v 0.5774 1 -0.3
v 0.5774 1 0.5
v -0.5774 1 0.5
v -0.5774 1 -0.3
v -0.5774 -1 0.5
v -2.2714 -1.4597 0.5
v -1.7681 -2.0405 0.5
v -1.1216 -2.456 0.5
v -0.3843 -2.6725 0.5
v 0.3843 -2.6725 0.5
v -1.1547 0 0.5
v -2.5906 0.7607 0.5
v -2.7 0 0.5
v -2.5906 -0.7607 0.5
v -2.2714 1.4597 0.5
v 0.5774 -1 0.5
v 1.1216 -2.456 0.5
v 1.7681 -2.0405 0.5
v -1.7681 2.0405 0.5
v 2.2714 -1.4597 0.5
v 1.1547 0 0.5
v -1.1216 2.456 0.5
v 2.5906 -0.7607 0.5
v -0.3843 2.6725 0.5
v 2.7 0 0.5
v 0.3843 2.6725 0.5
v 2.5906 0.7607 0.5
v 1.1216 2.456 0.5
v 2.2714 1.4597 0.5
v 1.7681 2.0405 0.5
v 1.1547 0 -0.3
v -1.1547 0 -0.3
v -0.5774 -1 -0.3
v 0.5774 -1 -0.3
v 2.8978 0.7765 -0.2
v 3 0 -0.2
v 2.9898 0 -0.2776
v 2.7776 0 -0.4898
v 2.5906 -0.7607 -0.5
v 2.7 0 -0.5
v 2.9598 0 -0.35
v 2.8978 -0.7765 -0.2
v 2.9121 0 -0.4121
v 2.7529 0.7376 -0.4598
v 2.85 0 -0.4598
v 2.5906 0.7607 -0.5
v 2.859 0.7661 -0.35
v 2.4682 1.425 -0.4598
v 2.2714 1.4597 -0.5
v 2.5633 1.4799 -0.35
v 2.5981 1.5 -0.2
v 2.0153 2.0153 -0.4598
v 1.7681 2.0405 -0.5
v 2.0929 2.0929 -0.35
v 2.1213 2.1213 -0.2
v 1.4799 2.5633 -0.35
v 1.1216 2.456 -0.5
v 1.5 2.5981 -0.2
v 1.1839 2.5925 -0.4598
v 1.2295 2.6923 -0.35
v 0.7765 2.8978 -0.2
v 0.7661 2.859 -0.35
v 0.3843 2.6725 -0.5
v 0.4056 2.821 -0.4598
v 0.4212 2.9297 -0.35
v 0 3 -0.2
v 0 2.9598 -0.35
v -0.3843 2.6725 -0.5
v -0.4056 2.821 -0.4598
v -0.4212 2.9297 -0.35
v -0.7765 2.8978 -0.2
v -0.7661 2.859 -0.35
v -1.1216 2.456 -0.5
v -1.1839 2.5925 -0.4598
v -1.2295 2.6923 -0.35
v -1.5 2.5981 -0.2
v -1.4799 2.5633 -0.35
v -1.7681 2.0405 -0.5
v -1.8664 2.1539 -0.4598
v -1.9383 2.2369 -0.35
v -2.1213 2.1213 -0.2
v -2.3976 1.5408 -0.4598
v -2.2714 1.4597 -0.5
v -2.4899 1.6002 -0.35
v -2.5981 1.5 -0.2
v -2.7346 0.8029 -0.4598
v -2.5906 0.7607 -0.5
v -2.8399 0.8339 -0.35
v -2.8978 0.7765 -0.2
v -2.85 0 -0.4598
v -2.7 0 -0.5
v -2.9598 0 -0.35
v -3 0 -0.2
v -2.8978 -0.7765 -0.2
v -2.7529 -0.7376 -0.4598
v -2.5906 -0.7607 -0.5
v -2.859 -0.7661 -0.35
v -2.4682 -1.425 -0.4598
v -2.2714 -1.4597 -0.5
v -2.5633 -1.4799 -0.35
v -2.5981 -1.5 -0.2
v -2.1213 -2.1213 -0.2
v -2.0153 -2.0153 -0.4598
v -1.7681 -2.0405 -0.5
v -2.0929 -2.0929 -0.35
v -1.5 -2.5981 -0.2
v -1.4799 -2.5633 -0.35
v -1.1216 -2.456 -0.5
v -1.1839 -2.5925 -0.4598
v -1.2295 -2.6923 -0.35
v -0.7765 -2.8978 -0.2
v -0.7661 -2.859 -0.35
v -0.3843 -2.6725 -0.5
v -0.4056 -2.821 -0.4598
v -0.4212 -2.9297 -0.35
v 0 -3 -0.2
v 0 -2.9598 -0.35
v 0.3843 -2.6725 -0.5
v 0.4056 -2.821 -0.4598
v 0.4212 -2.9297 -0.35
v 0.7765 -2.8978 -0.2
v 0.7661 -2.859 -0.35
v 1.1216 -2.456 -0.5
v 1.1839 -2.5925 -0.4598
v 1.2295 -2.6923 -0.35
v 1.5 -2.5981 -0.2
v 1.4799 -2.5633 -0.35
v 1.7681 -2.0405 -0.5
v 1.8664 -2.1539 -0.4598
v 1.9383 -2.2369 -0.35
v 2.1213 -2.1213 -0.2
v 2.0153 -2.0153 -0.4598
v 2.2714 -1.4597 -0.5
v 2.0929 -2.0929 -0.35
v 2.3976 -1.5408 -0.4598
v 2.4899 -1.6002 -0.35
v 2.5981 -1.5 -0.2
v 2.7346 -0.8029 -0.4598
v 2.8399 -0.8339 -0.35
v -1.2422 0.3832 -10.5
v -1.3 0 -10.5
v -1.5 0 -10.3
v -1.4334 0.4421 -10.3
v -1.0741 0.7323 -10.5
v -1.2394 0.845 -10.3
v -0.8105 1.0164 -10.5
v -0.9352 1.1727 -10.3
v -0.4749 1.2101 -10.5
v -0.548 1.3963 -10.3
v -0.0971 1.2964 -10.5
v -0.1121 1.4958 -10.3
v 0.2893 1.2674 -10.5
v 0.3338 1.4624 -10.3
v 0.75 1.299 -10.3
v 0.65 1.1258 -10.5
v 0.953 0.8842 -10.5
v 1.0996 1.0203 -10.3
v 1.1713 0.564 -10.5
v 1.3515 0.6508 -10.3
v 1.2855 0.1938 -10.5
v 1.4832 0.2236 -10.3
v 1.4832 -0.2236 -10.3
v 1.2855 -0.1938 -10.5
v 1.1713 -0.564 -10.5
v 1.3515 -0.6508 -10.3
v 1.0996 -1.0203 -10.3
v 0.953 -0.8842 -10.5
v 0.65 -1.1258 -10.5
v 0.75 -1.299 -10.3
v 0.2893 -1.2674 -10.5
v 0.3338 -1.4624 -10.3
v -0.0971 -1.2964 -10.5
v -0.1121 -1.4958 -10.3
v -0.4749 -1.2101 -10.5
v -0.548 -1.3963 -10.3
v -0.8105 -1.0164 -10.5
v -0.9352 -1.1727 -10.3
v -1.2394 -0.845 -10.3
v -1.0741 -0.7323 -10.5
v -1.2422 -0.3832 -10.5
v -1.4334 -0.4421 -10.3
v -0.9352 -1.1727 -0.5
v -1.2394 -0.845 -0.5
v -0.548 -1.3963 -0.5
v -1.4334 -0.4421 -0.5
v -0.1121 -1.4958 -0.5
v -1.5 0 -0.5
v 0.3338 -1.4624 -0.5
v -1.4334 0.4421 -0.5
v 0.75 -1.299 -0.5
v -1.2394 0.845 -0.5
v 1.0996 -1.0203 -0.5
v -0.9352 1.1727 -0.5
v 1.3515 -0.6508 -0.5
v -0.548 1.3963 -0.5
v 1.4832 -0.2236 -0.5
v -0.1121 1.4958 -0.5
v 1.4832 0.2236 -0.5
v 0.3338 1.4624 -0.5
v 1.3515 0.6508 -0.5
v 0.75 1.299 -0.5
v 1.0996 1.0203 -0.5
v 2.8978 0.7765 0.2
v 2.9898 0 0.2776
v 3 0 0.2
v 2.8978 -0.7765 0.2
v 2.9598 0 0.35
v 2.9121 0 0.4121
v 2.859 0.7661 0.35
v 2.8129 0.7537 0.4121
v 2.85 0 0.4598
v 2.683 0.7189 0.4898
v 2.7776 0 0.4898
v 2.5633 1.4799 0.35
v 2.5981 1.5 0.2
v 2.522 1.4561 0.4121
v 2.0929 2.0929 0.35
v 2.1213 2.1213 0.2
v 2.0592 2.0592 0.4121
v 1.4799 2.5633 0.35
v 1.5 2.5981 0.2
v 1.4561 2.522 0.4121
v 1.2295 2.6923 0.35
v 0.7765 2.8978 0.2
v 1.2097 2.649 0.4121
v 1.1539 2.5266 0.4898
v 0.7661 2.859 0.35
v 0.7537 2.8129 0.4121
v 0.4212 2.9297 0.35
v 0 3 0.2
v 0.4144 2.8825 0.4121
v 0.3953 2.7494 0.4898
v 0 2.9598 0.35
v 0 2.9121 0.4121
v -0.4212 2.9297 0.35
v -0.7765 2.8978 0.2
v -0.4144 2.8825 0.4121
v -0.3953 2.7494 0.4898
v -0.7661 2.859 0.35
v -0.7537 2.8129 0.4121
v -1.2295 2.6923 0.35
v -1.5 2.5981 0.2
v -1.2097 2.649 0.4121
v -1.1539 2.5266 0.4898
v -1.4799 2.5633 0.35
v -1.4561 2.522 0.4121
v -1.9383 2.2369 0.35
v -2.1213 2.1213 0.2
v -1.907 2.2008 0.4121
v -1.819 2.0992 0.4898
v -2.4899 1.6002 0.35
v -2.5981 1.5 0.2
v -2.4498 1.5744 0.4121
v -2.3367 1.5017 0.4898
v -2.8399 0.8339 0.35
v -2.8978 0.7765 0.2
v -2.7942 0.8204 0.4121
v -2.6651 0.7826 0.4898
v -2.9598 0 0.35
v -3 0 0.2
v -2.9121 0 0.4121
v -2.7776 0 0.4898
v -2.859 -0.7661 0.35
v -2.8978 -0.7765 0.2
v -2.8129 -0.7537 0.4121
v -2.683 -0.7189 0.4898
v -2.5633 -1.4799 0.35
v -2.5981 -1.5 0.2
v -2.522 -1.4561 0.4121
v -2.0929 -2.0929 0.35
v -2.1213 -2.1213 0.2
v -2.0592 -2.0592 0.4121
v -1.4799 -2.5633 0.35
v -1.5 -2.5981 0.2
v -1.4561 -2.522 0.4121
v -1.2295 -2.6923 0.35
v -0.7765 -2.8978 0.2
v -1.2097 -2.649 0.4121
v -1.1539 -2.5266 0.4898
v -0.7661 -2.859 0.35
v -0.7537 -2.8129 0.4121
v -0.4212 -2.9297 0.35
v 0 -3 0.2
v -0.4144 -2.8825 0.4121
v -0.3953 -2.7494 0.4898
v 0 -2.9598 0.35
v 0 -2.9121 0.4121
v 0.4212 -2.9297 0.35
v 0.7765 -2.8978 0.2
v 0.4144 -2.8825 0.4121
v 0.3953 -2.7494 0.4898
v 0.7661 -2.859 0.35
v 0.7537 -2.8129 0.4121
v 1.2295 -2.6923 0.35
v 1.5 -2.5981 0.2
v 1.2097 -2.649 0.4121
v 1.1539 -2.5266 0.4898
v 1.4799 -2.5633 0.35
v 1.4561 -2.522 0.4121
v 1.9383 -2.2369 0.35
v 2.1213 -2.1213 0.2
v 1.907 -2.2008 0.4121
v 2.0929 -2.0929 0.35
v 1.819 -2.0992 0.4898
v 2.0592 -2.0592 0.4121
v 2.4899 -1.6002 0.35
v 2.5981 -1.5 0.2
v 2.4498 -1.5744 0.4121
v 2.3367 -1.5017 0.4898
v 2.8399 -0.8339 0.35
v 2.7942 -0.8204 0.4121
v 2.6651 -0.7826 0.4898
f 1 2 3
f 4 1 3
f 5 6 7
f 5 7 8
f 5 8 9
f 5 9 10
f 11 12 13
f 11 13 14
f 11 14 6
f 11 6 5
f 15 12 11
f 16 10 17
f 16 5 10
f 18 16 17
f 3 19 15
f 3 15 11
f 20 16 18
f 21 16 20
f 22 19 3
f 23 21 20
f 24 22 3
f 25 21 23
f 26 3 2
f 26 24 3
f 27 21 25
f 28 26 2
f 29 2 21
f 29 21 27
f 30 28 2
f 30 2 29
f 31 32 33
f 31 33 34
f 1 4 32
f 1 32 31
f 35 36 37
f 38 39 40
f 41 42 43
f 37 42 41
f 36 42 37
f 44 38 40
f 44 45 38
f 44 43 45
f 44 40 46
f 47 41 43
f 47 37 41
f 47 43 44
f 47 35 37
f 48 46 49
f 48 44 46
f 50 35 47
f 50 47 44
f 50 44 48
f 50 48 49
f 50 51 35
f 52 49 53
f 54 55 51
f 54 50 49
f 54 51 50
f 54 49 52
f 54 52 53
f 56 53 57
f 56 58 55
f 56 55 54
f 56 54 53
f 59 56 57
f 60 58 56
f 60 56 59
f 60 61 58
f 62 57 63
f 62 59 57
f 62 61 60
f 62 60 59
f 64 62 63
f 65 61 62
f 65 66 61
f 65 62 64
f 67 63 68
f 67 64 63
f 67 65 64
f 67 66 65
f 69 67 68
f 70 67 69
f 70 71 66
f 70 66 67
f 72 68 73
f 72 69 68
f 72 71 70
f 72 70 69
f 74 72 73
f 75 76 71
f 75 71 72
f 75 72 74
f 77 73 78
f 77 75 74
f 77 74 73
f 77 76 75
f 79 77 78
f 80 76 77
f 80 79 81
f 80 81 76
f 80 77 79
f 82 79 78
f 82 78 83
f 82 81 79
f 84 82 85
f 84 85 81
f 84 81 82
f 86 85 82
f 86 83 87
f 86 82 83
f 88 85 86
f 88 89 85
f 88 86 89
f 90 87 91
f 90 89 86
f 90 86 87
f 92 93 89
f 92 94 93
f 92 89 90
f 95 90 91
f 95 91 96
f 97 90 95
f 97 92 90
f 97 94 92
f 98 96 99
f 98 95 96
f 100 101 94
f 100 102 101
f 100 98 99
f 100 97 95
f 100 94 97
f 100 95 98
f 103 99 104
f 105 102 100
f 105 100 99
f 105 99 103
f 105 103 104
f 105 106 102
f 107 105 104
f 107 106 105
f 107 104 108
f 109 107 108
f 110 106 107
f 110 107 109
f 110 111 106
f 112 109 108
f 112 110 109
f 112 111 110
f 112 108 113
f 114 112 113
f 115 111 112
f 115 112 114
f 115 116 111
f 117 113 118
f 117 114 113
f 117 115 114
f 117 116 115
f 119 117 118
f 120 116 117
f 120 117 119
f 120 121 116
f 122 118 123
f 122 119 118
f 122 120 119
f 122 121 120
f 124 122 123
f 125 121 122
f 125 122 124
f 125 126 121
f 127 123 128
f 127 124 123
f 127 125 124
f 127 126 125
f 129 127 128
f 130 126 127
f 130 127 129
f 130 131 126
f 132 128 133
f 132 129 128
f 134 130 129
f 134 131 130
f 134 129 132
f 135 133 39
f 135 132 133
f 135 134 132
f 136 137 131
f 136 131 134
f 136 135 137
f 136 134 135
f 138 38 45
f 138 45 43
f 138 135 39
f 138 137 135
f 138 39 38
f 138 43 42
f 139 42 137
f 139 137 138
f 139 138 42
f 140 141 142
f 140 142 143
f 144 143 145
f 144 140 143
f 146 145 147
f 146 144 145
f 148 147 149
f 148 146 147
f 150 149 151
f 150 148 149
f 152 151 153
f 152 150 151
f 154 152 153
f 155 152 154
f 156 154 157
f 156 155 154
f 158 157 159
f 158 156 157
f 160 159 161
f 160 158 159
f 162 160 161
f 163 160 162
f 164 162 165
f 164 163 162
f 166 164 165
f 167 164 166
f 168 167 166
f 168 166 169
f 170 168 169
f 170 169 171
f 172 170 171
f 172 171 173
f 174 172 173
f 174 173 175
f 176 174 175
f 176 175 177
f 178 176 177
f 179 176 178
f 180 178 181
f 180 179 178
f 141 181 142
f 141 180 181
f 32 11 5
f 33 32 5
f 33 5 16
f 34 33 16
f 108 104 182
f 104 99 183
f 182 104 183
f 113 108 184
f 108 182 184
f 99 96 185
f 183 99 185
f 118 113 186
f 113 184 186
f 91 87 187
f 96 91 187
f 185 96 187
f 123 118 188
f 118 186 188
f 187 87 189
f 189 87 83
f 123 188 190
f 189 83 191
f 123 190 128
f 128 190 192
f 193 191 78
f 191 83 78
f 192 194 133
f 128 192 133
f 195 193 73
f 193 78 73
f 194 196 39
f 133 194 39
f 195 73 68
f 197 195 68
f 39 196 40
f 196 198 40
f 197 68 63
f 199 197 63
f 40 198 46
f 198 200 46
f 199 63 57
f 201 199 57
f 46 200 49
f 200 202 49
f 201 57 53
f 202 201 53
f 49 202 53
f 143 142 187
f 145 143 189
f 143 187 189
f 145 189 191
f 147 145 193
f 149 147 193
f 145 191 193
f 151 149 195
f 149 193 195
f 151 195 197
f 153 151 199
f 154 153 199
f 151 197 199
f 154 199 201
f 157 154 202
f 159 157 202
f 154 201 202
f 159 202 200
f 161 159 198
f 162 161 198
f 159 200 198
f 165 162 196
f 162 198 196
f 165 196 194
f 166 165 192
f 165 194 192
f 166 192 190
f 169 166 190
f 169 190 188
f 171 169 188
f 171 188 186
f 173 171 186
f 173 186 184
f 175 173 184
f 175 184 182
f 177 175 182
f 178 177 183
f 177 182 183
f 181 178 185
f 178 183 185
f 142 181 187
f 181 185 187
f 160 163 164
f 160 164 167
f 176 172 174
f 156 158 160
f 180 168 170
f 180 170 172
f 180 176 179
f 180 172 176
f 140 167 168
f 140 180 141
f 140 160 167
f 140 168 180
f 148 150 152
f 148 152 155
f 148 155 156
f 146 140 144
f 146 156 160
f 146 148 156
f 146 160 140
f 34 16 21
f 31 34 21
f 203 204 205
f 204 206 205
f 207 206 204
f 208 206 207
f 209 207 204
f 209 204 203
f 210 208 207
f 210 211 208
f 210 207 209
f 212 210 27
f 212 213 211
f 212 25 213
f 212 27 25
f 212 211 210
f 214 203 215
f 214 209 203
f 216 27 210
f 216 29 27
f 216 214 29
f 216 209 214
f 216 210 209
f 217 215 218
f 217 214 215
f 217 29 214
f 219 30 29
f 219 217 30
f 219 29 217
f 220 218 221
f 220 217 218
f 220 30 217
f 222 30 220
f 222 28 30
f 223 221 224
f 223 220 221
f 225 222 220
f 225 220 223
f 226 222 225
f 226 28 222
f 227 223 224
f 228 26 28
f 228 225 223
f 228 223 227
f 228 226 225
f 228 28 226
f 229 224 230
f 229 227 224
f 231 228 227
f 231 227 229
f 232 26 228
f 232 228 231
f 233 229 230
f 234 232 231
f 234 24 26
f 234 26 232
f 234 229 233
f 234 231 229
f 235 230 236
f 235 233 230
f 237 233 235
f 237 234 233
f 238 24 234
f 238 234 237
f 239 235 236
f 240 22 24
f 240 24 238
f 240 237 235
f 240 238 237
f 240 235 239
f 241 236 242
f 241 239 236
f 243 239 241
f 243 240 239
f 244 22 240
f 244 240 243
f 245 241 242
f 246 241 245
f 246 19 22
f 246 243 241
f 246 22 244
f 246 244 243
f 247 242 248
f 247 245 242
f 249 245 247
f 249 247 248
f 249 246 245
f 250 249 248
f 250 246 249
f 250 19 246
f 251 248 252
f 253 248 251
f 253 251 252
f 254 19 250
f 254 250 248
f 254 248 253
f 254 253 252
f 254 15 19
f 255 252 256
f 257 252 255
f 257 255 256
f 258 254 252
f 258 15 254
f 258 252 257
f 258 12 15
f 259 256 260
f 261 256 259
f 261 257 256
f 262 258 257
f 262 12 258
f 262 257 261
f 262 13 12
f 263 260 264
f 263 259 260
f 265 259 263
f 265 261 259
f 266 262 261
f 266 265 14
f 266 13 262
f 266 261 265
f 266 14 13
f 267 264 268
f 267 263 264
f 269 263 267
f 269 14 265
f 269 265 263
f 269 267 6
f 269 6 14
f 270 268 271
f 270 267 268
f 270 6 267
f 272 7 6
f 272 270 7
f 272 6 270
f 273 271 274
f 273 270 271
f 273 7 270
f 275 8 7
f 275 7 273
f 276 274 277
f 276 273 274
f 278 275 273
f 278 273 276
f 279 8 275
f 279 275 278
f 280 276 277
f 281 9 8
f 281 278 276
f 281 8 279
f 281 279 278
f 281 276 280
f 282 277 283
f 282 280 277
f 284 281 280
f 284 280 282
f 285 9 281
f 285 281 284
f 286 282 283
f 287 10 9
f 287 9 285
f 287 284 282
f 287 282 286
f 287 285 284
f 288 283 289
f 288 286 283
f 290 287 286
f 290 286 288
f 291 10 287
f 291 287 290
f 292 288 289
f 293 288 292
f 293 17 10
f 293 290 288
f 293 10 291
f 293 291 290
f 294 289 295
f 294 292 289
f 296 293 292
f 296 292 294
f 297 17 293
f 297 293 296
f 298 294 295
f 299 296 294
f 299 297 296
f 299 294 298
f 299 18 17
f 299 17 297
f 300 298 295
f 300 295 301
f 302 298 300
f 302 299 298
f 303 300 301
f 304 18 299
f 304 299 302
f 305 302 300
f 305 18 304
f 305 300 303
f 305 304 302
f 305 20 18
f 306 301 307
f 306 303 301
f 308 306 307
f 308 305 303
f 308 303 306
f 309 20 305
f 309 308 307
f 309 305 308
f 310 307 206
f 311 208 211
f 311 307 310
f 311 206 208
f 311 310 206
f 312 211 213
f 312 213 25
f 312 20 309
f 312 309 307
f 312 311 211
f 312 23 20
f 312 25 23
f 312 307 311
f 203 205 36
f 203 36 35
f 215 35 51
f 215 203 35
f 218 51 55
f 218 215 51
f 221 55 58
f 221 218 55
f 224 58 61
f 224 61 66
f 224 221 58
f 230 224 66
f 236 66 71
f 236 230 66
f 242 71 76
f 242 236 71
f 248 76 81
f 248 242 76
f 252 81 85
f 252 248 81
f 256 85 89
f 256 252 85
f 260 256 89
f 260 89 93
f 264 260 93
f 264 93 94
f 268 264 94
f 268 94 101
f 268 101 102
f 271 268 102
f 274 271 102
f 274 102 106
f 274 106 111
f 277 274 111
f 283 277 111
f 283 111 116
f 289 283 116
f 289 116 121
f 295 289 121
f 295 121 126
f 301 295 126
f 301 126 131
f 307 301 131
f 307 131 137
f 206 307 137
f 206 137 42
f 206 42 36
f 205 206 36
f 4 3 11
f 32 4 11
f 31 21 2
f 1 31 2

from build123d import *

# Parameters (mm, degrees)
SKETCH_1_R          = 3
EXTRUDE_1_DEPTH     = 0.5
SKETCH_2_R          = 1.5
EXTRUDE_2_DEPTH     = 10
CHAMFER_1_SIZE      = 0.2
CUT_EXTRUDE_1_DEPTH = 0.8
FILLET_2_R          = 0.3


with BuildPart() as part:
    # 草图1 → 凸台-拉伸1 (new, symmetric)
    with BuildSketch(Plane.XY):
        Circle(SKETCH_1_R)
    extrude(amount=EXTRUDE_1_DEPTH, both=True)

    # 草图2 → 凸台-拉伸2 (add)
    with BuildSketch(Plane(origin=(0, 0, -0.5), x_dir=(-1, 0, 0), z_dir=(0, 0, -1))):
        Circle(SKETCH_2_R)
    extrude(amount=EXTRUDE_2_DEPTH)

    # 倒角1
    chamfer_1_edges = [part.edges().sort_by_distance(p)[0] for p in [
        (1.5, 0, -10.5),
    ]]
    chamfer(chamfer_1_edges, length=CHAMFER_1_SIZE)

    # 草图3 → 切除-拉伸1 (cut)
    with BuildSketch(Plane.XY.offset(0.5)):
        Polygon((1.154700538, 0), (0.577350269, 1), (-0.577350269, 1), (-1.154700538, 0), (-0.577350269, -1), (0.577350269, -1), align=None)
    extrude(amount=-CUT_EXTRUDE_1_DEPTH, mode=Mode.SUBTRACT)

    # 圆角2
    fillet_2_edges = [part.edges().sort_by_distance(p)[0] for p in [
        (-3, 0, -0.5),
        (-3, 0, 0.5),
    ]]
    fillet(fillet_2_edges, radius=FILLET_2_R)


solid = part.part
